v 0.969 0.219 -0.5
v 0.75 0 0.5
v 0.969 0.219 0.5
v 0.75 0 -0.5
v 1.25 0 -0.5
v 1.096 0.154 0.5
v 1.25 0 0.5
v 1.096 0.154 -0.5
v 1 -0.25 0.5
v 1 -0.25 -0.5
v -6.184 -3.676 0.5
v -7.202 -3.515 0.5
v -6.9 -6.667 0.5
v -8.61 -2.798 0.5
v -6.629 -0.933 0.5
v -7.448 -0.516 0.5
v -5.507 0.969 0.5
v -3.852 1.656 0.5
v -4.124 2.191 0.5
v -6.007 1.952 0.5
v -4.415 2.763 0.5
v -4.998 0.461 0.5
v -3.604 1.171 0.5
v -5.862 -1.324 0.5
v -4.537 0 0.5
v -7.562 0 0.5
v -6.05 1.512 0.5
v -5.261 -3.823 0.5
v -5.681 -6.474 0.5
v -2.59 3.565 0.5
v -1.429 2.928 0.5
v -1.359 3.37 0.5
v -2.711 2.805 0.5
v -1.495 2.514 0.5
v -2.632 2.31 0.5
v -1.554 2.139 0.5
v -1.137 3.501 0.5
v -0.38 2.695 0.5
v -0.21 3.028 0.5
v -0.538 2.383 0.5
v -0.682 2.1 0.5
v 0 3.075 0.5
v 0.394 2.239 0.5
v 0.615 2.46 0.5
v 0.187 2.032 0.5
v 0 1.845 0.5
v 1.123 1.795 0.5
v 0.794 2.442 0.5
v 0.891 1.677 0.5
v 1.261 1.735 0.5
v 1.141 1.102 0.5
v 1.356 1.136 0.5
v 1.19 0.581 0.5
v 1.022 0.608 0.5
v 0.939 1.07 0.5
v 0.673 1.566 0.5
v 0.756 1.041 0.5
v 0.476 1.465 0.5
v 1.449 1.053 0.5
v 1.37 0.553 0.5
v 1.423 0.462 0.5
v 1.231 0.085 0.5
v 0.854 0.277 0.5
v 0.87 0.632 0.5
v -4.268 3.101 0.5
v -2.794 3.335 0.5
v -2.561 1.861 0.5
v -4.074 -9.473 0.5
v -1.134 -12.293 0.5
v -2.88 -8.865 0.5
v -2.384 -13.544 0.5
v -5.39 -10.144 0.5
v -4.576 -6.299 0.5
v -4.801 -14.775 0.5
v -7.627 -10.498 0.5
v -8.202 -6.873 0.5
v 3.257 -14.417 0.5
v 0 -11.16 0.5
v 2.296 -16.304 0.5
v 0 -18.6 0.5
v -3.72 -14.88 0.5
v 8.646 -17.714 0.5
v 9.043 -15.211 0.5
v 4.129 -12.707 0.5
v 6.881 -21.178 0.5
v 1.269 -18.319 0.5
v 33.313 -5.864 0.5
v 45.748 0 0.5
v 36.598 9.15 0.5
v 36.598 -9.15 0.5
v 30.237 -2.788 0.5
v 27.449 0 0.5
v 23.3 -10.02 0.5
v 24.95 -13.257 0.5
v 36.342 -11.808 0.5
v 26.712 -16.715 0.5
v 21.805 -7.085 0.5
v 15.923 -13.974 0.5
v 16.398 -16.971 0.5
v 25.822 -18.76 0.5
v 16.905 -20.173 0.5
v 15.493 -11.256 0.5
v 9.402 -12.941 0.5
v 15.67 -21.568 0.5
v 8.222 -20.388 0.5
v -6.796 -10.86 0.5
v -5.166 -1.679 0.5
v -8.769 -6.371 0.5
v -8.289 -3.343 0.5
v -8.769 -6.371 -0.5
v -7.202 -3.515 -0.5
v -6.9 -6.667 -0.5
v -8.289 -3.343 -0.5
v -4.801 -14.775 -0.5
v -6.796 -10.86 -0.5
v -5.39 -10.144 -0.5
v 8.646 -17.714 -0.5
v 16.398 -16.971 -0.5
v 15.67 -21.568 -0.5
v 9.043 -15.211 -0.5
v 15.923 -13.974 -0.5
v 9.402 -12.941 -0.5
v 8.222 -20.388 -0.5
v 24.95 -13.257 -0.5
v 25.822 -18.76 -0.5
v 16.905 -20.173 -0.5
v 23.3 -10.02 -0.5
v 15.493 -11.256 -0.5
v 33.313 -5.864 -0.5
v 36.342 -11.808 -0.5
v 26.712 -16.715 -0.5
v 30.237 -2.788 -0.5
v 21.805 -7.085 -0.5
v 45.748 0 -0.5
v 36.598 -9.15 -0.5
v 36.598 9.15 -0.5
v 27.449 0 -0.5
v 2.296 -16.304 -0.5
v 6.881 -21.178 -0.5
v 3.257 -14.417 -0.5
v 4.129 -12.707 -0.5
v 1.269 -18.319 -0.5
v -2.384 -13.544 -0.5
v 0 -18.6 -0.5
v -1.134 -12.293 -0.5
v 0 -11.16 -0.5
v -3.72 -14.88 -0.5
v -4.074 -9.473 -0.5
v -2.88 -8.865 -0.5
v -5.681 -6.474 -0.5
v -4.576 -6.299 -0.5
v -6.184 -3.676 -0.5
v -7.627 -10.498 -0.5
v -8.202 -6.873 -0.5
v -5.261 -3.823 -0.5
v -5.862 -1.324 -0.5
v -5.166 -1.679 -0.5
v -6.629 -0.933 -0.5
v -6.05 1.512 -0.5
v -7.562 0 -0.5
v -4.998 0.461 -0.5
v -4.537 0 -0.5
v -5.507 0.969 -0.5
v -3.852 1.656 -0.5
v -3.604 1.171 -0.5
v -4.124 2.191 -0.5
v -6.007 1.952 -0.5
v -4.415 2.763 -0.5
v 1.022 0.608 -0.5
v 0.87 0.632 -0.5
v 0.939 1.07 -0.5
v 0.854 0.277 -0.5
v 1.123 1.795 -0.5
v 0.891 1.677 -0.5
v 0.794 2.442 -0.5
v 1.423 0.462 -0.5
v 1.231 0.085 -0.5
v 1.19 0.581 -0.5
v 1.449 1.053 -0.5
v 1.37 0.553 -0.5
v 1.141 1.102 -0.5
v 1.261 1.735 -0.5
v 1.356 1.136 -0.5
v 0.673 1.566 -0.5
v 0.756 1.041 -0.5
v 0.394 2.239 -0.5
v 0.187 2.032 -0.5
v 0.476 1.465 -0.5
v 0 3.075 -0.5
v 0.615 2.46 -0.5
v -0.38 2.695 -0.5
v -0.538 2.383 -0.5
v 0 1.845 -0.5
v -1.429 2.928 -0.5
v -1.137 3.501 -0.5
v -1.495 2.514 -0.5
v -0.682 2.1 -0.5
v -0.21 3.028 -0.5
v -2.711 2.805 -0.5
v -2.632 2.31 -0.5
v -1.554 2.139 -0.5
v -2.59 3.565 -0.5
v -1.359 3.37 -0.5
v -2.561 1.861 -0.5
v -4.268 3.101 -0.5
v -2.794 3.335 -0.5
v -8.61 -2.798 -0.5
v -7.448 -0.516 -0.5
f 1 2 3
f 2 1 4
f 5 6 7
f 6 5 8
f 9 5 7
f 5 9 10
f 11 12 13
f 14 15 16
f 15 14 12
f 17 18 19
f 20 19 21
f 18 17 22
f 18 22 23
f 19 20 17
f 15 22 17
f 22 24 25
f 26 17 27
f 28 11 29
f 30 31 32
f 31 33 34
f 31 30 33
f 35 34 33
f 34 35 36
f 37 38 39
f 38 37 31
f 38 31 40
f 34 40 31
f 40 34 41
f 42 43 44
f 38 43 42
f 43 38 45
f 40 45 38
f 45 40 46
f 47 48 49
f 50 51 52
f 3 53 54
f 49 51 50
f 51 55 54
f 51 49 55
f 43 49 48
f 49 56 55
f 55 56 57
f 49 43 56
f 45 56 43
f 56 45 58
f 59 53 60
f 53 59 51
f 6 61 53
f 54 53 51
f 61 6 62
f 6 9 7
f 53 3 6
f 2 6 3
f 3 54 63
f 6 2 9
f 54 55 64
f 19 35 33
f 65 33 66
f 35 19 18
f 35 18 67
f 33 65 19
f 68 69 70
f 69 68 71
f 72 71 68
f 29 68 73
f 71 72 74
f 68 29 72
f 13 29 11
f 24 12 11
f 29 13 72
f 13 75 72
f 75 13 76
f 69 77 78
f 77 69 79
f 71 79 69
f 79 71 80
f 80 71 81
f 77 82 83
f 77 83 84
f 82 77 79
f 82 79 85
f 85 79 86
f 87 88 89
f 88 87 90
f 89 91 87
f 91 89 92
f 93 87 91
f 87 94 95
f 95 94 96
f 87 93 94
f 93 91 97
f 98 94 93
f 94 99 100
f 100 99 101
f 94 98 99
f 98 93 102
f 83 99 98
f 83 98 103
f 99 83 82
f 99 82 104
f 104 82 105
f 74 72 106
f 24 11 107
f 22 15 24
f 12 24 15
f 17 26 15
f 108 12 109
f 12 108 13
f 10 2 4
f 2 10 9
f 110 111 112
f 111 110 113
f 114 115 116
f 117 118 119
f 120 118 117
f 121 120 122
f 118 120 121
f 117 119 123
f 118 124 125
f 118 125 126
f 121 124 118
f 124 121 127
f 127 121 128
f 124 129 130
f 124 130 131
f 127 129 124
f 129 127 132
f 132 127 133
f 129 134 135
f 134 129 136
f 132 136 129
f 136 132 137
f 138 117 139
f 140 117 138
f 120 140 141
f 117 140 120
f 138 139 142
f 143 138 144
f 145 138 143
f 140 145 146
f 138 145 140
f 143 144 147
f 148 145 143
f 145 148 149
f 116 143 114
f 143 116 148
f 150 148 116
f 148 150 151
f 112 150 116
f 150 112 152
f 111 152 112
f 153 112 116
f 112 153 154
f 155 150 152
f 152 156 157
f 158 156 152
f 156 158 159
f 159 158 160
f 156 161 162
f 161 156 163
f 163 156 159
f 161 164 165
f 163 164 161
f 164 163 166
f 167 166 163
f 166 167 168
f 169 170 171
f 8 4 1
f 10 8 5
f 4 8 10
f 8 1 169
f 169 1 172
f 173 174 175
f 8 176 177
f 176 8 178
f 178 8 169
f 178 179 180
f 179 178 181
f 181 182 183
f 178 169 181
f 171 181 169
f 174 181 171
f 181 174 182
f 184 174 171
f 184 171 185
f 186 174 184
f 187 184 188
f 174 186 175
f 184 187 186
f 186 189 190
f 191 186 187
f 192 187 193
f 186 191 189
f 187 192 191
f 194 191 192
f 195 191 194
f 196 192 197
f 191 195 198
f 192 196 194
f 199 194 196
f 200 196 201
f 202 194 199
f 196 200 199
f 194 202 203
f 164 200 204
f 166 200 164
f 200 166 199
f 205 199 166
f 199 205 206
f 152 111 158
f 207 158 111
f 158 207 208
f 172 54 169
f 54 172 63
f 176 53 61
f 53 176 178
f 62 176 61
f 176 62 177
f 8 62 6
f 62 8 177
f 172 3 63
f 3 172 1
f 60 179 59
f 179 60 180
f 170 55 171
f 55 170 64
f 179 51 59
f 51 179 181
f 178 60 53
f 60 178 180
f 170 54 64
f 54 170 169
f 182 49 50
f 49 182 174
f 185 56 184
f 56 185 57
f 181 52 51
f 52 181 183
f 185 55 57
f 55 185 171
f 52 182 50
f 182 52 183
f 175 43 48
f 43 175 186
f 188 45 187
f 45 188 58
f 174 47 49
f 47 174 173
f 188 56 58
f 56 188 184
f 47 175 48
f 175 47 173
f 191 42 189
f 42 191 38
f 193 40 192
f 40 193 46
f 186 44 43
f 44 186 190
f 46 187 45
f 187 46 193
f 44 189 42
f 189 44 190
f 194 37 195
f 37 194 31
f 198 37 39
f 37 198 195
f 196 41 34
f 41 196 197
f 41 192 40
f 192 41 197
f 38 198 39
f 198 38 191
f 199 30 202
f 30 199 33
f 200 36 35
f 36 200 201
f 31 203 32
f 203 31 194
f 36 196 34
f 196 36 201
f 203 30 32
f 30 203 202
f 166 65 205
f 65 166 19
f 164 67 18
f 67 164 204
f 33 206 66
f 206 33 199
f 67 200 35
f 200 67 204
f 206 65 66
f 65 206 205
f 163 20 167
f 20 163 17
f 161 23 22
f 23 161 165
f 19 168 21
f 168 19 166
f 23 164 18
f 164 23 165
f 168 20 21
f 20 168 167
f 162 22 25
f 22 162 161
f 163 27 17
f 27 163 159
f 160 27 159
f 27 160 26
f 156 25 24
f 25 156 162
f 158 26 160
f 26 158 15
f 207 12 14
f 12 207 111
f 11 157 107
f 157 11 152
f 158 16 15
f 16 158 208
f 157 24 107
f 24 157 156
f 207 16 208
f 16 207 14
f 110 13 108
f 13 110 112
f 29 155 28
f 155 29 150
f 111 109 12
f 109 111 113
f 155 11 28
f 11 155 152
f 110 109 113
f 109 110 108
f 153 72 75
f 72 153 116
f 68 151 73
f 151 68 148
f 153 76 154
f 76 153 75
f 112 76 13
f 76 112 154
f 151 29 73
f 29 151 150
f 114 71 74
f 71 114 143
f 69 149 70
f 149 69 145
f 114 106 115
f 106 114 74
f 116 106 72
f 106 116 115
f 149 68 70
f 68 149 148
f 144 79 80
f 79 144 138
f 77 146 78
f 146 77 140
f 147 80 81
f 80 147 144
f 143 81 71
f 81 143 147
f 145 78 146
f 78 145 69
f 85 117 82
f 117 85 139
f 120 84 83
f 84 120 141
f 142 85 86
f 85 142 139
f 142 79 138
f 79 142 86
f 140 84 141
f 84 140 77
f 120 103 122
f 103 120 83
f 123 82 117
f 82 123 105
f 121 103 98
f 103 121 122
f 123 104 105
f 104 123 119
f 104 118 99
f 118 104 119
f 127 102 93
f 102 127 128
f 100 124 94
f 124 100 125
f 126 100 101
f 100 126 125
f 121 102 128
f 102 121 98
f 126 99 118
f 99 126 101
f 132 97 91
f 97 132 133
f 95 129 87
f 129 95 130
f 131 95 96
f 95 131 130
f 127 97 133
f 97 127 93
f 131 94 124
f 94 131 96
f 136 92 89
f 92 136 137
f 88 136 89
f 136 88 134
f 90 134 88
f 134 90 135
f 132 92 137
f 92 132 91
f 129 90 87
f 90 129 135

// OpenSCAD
// [FL_INDEX: keywords="openscad, 3d_parametric, Golden_Spyral_custom-test, csg_solid" | COT="Parametric OpenSCAD design from 3DCodeverse"]
// Title: Golden Spyral(custom-test)

spiral_constant=5;//[1:5]
details=2;//[1:20]
elements_in_circle=20;//[4:10]
acnt=1*1;
bcnt=0.002*spiral_constant;
angleStep=360/elements_in_circle;
$fn=2+details;

module drowElem(rad) {
  stepRad=acnt*exp(bcnt*rad);
  rotate(a=rad,v=[0,0,1]) translate([stepRad,0,0]) cylinder(h=1, r=stepRad/4, center=true);
}

for(rad=[0:angleStep:360]) {
 drowElem(rad);
}
